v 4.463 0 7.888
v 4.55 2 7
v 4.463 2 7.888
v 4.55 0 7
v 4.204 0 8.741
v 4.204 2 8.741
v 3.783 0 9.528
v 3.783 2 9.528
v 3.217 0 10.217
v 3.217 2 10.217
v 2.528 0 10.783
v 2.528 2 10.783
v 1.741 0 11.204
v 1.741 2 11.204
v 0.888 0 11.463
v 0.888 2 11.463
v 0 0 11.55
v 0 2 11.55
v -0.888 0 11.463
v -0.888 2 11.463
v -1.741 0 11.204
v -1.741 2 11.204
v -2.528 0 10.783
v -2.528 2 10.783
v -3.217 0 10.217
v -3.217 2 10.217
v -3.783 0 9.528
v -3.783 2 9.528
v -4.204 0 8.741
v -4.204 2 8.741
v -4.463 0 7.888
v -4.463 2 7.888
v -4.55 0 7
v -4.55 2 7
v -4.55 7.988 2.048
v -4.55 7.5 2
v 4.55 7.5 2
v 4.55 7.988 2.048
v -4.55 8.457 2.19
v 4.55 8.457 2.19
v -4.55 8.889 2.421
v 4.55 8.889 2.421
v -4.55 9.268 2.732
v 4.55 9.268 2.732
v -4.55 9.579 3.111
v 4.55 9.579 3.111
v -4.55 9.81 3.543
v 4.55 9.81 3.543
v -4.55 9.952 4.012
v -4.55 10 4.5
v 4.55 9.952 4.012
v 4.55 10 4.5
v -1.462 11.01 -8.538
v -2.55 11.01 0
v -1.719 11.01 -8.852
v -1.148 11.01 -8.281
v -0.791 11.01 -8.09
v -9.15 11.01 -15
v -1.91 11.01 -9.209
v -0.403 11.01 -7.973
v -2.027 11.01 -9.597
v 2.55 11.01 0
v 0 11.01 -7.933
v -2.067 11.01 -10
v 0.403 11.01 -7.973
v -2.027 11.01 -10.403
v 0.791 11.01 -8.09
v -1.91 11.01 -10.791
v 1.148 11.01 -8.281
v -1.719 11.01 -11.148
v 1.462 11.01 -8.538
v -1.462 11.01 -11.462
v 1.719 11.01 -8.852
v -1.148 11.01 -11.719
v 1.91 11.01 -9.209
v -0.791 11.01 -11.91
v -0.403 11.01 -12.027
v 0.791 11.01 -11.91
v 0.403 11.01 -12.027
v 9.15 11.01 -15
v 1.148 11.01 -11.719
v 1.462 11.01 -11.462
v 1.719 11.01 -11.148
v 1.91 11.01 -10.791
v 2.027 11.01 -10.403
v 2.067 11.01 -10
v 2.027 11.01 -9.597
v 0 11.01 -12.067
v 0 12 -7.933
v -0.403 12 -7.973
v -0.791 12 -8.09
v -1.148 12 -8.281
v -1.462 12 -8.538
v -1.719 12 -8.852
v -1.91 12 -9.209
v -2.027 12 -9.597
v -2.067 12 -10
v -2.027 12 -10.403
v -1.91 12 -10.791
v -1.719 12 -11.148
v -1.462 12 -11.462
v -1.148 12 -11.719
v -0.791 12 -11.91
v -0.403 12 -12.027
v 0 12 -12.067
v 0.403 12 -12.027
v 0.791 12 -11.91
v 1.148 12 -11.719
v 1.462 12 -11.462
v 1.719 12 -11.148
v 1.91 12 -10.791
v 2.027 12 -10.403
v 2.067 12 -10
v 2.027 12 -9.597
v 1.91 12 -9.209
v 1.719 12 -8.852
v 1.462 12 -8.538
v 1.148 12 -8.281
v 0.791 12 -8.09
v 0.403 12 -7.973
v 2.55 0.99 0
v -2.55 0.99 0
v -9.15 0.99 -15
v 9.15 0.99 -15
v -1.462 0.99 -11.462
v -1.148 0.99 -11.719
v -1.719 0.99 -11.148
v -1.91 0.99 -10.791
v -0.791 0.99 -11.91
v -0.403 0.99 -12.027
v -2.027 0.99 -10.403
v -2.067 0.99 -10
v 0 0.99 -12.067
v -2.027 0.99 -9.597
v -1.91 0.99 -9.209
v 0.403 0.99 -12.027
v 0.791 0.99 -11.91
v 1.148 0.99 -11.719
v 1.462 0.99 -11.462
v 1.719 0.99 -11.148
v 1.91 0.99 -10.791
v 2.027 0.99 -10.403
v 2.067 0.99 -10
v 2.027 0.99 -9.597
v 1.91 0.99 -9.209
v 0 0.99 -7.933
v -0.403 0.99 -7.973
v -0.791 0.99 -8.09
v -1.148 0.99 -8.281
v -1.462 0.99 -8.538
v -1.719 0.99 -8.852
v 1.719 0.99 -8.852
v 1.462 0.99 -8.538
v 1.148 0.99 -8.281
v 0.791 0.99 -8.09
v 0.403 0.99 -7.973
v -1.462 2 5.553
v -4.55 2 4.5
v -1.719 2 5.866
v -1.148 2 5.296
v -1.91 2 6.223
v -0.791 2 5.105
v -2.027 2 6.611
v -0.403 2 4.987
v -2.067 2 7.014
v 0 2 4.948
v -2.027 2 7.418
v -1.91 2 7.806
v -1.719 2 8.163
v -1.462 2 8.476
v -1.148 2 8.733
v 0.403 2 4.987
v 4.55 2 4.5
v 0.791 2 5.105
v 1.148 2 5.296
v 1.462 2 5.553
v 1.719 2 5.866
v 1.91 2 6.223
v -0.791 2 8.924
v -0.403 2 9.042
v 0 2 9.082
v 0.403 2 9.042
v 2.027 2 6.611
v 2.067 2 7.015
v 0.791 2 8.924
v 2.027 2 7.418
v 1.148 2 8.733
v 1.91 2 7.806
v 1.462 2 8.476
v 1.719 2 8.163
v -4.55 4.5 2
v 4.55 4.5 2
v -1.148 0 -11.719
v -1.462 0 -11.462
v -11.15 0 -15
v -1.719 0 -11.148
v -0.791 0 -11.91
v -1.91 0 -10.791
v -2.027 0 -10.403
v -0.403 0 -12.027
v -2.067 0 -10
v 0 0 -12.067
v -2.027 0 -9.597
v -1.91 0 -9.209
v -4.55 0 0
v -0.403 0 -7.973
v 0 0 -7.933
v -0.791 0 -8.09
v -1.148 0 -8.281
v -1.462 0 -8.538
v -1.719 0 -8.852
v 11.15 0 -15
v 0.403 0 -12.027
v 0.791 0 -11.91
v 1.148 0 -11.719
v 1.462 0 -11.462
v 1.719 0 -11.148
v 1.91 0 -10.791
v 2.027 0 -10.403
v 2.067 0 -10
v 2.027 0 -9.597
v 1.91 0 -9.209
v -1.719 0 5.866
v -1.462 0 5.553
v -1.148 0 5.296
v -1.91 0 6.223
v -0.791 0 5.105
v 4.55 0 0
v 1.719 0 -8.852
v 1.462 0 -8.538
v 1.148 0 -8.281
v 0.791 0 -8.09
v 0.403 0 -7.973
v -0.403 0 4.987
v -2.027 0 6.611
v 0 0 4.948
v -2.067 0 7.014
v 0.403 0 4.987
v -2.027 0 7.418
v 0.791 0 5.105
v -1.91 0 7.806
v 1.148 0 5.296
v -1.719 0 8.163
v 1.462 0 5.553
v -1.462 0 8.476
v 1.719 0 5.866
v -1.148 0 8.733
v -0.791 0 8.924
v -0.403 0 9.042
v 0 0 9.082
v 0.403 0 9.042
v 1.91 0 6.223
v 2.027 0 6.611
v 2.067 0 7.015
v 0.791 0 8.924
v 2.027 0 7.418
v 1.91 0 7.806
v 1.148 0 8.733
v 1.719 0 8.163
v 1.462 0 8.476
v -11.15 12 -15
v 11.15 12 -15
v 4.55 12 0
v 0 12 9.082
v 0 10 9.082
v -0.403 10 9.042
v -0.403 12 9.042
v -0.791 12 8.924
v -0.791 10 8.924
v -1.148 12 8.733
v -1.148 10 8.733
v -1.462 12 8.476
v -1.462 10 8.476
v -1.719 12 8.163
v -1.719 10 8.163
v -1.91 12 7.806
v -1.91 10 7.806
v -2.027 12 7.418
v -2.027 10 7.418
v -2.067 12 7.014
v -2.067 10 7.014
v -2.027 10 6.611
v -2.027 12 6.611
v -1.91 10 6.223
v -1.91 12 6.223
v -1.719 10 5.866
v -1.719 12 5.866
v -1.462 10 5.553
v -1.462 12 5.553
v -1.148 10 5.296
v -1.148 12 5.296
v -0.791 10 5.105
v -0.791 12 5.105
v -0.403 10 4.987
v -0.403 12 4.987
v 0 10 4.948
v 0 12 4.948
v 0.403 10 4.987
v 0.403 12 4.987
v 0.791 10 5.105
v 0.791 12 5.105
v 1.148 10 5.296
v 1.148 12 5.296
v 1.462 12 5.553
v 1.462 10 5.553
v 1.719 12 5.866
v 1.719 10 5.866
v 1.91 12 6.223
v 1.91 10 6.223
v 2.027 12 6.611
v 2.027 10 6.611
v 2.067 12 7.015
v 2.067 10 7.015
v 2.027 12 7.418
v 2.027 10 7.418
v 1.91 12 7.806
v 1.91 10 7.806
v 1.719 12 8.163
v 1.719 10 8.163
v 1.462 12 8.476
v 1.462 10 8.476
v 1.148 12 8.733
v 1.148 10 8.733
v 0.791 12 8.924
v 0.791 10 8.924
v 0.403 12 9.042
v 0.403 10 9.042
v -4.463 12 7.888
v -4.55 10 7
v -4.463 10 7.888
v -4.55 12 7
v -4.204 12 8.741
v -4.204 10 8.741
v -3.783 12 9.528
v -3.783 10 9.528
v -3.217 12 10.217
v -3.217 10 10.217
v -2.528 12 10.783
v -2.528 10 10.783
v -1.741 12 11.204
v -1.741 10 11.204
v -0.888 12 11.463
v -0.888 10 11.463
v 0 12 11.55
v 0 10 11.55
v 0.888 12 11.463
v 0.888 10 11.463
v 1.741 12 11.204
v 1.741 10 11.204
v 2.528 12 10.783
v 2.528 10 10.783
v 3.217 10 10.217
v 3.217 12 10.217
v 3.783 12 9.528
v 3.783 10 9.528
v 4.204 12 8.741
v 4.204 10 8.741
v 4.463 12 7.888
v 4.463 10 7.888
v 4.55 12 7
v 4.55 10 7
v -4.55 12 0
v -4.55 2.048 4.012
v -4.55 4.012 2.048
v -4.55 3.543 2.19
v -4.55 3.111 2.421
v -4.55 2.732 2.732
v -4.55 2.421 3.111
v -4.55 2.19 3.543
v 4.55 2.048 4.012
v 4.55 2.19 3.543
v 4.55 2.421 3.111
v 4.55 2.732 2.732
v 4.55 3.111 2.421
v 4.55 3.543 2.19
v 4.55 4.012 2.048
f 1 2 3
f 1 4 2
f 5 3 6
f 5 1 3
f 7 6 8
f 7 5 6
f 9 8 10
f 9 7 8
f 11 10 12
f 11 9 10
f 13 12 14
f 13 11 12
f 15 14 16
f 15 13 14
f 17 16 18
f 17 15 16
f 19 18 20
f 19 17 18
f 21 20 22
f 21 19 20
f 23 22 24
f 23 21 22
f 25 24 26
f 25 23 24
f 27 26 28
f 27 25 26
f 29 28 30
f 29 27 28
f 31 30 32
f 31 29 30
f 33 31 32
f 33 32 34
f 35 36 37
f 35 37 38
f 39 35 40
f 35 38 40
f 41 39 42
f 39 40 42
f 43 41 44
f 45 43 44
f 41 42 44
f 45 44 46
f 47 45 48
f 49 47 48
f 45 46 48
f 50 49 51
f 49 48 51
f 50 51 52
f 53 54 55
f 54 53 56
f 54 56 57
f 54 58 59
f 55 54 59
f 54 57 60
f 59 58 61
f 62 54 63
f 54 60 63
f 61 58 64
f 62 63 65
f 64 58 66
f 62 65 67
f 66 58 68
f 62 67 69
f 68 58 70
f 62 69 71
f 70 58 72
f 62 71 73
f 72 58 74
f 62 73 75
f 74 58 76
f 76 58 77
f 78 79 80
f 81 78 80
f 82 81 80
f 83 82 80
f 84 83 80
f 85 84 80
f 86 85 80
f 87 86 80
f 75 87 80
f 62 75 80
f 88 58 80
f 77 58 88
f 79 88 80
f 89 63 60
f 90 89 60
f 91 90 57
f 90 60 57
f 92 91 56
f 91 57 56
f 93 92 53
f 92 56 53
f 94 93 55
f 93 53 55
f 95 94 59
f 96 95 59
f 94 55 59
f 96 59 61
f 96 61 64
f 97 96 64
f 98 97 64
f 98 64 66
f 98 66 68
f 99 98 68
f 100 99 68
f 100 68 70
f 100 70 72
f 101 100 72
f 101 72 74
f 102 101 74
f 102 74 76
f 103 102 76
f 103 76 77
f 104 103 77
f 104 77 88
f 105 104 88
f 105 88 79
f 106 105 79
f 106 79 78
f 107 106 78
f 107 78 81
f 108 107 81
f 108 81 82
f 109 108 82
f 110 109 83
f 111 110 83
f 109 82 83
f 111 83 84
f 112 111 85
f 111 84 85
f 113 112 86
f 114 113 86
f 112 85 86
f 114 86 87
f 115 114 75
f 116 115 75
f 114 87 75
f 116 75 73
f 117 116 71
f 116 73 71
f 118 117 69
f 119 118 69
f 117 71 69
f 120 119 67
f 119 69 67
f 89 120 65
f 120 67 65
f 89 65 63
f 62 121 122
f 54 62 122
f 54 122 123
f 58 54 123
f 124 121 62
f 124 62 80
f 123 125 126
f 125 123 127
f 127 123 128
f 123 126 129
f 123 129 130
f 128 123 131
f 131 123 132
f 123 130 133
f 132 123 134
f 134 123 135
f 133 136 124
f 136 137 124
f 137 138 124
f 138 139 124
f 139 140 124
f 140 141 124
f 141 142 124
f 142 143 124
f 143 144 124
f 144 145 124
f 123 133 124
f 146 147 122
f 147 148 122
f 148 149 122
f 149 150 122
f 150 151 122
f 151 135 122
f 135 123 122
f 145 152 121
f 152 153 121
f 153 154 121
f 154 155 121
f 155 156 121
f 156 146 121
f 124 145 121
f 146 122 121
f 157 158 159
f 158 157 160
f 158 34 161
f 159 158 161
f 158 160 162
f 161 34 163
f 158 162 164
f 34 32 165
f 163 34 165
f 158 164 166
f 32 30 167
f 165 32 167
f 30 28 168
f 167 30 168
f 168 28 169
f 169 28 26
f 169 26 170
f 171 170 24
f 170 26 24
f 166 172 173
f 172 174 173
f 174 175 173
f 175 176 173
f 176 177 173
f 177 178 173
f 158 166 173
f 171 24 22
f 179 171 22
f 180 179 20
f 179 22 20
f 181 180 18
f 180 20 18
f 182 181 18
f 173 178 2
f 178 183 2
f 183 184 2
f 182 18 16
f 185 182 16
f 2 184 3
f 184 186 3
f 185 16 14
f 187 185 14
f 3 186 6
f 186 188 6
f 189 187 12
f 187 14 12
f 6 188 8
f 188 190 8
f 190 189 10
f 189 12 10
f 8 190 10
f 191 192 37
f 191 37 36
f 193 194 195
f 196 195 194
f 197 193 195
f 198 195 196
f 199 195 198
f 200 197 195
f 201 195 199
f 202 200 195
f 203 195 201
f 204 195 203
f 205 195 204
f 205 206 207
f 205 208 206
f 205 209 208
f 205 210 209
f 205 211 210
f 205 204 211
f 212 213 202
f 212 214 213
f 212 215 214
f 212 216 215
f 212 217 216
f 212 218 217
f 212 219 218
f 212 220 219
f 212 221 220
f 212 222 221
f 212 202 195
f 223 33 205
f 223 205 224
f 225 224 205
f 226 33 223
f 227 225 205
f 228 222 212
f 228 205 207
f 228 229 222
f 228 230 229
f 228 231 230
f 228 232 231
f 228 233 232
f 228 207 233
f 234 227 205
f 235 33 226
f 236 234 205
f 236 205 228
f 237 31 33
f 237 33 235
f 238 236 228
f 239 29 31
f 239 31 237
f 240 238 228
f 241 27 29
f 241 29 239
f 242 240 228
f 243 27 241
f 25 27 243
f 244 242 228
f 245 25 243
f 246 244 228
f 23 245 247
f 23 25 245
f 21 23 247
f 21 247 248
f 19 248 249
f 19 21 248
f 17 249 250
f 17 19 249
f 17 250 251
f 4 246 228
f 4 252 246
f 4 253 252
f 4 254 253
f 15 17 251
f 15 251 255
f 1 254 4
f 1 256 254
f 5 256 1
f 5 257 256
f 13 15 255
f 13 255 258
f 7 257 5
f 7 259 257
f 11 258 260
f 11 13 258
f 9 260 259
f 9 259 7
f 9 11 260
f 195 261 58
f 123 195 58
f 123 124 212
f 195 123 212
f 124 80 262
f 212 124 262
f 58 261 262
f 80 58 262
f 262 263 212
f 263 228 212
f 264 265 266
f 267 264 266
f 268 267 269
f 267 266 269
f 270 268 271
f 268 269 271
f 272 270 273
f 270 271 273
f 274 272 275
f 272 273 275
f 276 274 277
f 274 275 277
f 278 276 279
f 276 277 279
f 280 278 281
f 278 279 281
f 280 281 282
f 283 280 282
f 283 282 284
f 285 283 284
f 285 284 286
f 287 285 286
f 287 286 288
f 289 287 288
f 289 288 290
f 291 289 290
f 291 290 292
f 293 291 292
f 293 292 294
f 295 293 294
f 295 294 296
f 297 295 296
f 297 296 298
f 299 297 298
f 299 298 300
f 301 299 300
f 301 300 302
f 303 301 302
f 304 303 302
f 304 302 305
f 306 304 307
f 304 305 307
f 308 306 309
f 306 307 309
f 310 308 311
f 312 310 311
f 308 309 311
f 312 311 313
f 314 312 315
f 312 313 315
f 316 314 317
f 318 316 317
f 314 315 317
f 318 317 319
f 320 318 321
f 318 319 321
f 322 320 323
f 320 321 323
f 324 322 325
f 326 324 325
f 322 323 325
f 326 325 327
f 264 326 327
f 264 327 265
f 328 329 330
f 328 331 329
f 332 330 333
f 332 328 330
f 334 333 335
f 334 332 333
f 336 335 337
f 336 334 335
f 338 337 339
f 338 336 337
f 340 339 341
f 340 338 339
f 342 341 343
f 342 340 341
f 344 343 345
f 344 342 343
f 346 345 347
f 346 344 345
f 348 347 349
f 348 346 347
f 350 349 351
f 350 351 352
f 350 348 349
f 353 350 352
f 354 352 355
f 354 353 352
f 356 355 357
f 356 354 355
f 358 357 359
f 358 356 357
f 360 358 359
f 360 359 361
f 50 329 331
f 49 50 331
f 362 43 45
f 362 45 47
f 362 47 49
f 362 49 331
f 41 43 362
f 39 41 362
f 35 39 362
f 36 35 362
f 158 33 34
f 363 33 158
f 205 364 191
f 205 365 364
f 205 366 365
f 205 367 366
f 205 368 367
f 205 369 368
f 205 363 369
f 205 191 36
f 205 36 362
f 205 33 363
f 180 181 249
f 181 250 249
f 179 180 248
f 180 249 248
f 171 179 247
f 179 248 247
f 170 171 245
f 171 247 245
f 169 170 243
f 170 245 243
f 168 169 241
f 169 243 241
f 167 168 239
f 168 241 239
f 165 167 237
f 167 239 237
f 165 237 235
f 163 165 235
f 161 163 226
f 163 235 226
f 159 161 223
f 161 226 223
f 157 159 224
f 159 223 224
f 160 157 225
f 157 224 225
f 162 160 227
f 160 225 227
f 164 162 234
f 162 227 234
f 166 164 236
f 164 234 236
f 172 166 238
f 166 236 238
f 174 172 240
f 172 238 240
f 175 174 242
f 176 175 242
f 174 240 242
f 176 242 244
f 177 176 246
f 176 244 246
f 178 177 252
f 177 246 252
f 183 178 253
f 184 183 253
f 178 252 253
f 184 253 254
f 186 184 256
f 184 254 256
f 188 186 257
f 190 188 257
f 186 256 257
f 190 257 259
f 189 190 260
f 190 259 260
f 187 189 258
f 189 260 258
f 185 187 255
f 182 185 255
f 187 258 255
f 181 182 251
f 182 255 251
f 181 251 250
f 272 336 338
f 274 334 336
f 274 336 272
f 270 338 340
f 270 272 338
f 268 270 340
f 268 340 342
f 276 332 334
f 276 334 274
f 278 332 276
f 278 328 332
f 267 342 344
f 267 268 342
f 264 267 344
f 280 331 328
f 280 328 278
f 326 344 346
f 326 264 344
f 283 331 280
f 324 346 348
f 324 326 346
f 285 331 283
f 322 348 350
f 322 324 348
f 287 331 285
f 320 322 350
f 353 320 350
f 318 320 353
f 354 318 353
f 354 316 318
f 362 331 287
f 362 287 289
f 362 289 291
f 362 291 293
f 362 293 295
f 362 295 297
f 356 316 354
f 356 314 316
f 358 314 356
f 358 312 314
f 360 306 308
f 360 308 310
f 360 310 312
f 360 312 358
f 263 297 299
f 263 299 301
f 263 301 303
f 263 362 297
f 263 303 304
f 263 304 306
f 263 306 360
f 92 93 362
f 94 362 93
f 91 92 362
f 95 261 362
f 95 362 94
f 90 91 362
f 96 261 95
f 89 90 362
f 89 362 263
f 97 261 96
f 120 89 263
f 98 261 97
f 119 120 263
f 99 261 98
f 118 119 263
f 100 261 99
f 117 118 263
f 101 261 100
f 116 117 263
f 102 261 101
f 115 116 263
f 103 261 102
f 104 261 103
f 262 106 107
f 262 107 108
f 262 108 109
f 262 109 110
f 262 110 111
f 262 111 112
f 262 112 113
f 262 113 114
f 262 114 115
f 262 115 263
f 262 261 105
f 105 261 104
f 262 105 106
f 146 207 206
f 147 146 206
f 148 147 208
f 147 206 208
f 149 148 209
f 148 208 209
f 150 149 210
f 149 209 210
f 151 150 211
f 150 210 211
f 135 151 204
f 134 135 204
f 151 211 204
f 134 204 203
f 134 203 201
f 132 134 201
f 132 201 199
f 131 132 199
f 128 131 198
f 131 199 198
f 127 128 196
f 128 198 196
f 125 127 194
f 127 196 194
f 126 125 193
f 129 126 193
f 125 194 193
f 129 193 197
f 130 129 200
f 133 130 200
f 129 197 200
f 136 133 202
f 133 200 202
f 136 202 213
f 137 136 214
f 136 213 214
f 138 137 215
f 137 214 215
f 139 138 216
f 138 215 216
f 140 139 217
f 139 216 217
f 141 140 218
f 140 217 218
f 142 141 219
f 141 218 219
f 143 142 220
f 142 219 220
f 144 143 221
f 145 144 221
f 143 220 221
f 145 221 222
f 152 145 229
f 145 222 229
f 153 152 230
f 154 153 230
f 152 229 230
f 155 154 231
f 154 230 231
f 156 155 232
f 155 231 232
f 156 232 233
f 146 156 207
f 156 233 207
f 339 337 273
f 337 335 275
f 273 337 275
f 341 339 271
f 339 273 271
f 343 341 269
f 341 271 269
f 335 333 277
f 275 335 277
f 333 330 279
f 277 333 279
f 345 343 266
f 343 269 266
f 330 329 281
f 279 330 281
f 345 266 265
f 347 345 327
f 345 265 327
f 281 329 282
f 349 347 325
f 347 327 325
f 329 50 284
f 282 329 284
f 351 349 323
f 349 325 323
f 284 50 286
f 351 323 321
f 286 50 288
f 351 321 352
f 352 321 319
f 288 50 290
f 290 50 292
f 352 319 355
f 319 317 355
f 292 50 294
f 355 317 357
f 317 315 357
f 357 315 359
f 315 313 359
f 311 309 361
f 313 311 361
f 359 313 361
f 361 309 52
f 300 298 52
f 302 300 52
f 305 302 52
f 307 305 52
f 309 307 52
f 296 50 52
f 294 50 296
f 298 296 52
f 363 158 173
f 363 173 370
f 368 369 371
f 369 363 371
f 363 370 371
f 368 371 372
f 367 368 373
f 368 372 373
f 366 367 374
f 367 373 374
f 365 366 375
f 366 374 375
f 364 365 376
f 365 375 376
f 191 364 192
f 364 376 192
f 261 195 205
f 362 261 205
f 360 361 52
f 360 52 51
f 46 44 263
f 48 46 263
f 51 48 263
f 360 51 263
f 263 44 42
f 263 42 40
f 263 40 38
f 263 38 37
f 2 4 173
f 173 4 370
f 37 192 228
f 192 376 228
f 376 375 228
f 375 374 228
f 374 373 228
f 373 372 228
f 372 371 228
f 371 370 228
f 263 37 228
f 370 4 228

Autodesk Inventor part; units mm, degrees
ref_plane "YZ Plane" through (0, 0, 0) normal (1, 0, 0) x (0, 1, 0)
ref_plane "XZ Plane" through (0, 0, 0) normal (0, 1, 0) x (-1, 0, 0)
ref_plane "XY Plane" through (0, 0, 0) normal (0, 0, 1) x (1, 0, 0)
sketch "Esquisse1" plane through (0, 0, 0) normal (0, 1, 0) x (-1, 0, 0)
  line L0 (0, 0) -> (0, -15)
  line L1 (0, -15) -> (9.15, -15)
  line L2 (0, -15) -> (9.15, -15) construction
  line L3 (0, -15) -> (-9.15, -15)
  line L4 (0, 0) -> (2.55, 0)
  line L5 (0, 0) -> (-2.55, 0)
  line L6 (-2.55, 0) -> (-9.15, -15)
  line L7 (2.55, 0) -> (9.15, -15)
  line L8 (2.55, 0) -> (4.55, 0)
  line L9 (9.15, -15) -> (11.15, -15)
  line L10 (11.15, -15) -> (4.55, 0)
  line L11 (-9.15, -15) -> (-11.15, -15)
  line L12 (-2.55, 0) -> (-4.55, 0)
  line L13 (-4.55, 0) -> (-11.15, -15)
  line L14 (0, 0) -> (0, 2)
  line L15 (0, 2) -> (4.55, 2)
  line L16 (4.55, 2) -> (4.55, 0)
  line L17 (0, 2) -> (-4.55, 2)
  line L18 (-4.55, 2) -> (-4.55, 0)
  dimension "d0" = 15
  dimension "d1" = 9.15
  dimension "d2" = 0
  dimension "d3" = 9.15
  dimension "d4" = 2.55
  dimension "d5" = 2.55
  dimension "d7" = 2
  dimension "d8" = 2
  dimension "d9" = 2
  dimension "d10" = 2
  dimension "d11" = 2
extrude "Extrusion1" add sketch "Esquisse1" along normal blind 12 contours L14 L15 L16 L8 L4 | L5 L12 L18 L17 L14 | L8 L10 L9 L7 | L6 L11 L13 L12
sketch "Esquisse2" plane through (0, 0, 0) normal (0, -1, 0) x (1, 0, 0)
  line L0 (-2.55, 0) -> (-9.15, -15) projected
  line L1 (-2.55, 0) -> (-9.15, -15)
  line L2 (9.15, -15) -> (2.55, 0) projected
  line L3 (-9.15, -15) -> (9.15, -15)
  line L4 (9.15, -15) -> (2.55, 0)
  line L5 (2.55, 0) -> (-2.55, 0)
  point P0 (0, 0)
extrude "Extrusion2" add sketch "Esquisse2" against normal blind 0.99
sketch "Esquisse3" plane through (0, 12, 0) normal (0, 1, 0) x (1, 0, 0)
  line L0 (2.55, 0) -> (-2.55, 0) projected
  line L1 (2.55, 0) -> (-2.55, 0)
  line L2 (-9.15, 15) -> (-11.15, 15) projected
  line L3 (-2.55, 0) -> (-9.15, 15)
  line L4 (9.15, 15) -> (2.55, 0) projected
  line L5 (-9.15, 15) -> (9.15, 15)
  line L6 (9.15, 15) -> (2.55, 0)
  point P0 (0, 0)
extrude "Extrusion3" add sketch "Esquisse3" against normal blind 0.99
sketch "Esquisse4" plane through (0, 12, 0) normal (0, 1, 0) x (1, 0, 0)
  line L0 (0, 0) -> (0, 15)
  line L1 (11.15, 15) -> (-11.15, 15) projected
  line L2 (0, 0) -> (0, 10)
  line L3 (0, 10) -> (0, 20)
  dimension "d18" = 10
  dimension "d19" = 10
hole "Perçage1" at (0, 12, -10) at (0, 12, -20) direction (0, -1, 0) diameter 4.134 end through all thread size "M5x0.8" class "6H" standard "ISO Metric profile"
sketch "Esquisse5" plane through (0, 12, 0) normal (0, 1, 0) x (1, 0, 0)
  line L0 (-4.55, -2) -> (4.55, -2) projected
  line L1 (-4.55, -2) -> (-4.55, -7)
  line L2 (-4.55, -7) -> (4.55, -7)
  line L3 (4.55, -7) -> (4.55, -2)
  arc A0 (-4.55, -7) -> (4.55, -7) centre (0, -7) ccw
  point P0 (0, 0)
  dimension "d27" = 5
extrude "Extrusion4" add sketch "Esquisse5" against normal blind 2
fillet "Congé1" radius 2.5 1 edges at (0, 10, 2)
sketch "Esquisse7" plane through (0, 12, 0) normal (0, 1, 0) x (1, 0, 0)
  line L0 (4.55, -4.5) -> (-4.55, -4.5) projected
  line L1 (0, -4.5) -> (0, -7.0145)
  point P0 (0, 0)
  dimension "d43" = 2.5145
sketch "Esquisse8" plane through (0, 0, 0) normal (0, -1, 0) x (1, 0, 0)
  line L0 (-4.55, 2) -> (4.55, 2) projected
  line L1 (-4.55, 7) -> (-4.55, 2)
  line L2 (4.55, 7) -> (4.55, 0) projected
  line L3 (4.55, 2) -> (4.55, 7)
  line L4 (-4.55, 2) -> (4.55, 2)
  arc A0 (4.55, 7) -> (-4.55, 7) centre (0, 0.4199) ccw
  arc A1 (4.55, 7) -> (-4.55, 7) centre (0, 7) ccw projected
  line L5 (-4.55, 0) -> (-4.55, 7) projected
  point P0 (0, 0)
extrude "Extrusion5" add sketch "Esquisse8" against normal blind 2
fillet "Congé2" radius 2.5 1 edges at (0, 2, 2)
hole "Perçage2" at (0, 12, 7.0145) direction (0, -1, 0) diameter 4.134 end through all thread size "M5x0.8" class "6H" standard "ISO Metric profile"
properties part number "Fixation_rotule_axe_centrale"
